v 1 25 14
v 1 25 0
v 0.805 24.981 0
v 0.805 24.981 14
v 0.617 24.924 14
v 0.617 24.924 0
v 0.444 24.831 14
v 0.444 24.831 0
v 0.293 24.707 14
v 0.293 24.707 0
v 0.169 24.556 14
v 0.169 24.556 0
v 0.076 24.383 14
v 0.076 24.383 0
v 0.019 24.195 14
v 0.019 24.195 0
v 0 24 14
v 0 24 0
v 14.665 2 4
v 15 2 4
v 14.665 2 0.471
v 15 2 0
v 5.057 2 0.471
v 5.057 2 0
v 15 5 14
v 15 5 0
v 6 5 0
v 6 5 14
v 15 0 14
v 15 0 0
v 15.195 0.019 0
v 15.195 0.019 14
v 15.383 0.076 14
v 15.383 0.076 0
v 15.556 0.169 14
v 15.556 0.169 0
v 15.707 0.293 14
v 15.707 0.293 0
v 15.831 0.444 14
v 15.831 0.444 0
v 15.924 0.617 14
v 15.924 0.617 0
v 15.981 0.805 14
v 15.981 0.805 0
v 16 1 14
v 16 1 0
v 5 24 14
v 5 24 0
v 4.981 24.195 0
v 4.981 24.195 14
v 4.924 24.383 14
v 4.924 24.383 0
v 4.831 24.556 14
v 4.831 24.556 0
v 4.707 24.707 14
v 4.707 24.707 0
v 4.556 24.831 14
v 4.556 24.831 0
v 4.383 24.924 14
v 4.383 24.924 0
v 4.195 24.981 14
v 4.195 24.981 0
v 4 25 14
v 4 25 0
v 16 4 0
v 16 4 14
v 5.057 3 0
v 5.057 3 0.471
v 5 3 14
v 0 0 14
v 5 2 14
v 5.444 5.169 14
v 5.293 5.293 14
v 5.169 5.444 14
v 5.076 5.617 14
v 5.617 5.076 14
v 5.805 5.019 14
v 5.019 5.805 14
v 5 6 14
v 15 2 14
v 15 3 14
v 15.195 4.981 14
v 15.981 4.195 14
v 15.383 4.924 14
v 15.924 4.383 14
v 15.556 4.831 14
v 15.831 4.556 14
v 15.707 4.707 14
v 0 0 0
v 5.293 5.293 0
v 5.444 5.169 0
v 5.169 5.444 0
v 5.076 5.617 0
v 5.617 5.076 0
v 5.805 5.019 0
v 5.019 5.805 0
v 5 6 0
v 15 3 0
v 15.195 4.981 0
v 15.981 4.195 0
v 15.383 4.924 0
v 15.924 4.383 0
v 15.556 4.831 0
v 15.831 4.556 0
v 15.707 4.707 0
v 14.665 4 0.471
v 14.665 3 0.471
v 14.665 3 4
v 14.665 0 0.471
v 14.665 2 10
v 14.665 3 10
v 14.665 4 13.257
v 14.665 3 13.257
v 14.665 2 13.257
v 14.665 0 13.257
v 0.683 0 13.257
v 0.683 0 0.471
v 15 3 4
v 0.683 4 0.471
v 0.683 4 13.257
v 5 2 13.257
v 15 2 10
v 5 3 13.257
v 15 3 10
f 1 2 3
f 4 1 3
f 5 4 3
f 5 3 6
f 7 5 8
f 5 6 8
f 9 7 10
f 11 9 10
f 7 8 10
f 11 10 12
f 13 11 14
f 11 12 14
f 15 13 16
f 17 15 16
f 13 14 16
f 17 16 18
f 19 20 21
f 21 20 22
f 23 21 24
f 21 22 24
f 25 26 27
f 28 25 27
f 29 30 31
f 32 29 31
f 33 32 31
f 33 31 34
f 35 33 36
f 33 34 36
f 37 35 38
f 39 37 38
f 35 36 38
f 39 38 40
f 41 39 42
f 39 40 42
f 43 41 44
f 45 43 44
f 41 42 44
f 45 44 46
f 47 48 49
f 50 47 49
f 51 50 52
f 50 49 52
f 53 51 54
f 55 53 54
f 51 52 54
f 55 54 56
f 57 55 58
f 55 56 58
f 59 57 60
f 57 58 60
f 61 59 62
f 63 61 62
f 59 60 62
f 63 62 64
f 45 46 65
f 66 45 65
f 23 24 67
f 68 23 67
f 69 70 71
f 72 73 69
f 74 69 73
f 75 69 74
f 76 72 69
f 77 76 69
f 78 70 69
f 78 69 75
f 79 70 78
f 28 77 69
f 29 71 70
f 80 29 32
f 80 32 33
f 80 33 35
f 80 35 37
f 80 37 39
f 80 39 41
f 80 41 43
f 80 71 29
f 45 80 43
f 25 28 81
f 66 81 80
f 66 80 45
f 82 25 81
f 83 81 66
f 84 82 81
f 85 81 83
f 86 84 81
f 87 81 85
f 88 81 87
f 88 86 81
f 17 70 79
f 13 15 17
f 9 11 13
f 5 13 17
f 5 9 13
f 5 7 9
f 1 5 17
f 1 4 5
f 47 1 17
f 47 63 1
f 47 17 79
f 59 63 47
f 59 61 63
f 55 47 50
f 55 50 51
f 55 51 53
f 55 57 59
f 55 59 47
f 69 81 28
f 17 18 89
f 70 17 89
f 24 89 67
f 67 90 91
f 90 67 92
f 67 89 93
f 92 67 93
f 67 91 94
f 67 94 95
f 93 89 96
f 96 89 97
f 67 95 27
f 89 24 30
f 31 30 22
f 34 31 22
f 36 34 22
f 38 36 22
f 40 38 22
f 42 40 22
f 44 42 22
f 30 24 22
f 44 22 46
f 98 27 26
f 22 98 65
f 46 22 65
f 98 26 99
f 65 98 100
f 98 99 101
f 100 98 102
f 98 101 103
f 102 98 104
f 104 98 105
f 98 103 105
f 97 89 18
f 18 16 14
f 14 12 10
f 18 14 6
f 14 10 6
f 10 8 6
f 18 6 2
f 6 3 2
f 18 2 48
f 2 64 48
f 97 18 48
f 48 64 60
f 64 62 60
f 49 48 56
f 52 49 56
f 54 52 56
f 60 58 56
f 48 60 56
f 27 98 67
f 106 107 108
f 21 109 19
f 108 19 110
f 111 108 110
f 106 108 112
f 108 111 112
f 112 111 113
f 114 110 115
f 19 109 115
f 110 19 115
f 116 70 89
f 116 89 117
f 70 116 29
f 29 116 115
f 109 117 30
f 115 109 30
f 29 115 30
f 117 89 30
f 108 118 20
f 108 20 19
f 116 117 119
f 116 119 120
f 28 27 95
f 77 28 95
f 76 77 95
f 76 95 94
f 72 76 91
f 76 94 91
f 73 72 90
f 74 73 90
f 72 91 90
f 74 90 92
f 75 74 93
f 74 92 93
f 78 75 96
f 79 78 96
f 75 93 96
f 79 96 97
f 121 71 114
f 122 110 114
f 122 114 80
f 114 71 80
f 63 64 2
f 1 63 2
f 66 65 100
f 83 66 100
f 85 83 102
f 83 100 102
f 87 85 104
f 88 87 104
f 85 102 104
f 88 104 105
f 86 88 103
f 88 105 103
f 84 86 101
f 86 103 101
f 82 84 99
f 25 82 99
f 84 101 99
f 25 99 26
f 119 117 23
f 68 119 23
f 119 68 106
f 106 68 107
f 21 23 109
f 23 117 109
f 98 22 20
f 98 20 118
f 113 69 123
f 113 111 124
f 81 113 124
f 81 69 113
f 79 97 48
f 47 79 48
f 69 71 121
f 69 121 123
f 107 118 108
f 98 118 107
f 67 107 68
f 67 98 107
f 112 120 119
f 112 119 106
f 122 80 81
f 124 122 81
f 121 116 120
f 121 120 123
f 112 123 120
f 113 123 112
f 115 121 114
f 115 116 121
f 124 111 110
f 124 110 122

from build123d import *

# Parameters (mm, degrees)
BOSS_EXTRUDE3_DEPTH = 14
SKETCH3_W           = 13.981436564
SKETCH3_H           = 12.786132402
CUT_EXTRUDE2_DEPTH  = 4
SKETCH4_W           = 10
SKETCH4_H           = 1
CUT_EXTRUDE3_DEPTH  = 4
SKETCH5_W           = 8
SKETCH5_H           = 1
CUT_EXTRUDE4_DEPTH  = 4
SKETCH6_W           = 1.942983733
SKETCH6_H           = 1
CUT_EXTRUDE5_DEPTH  = 4


with BuildPart() as part:
    # Sketch1 → Boss-Extrude3 (new body)
    with BuildSketch(Plane.XY):
        with BuildLine():
            Line((0, 24), (0, 0))
            Line((0, 0), (15, 0))
            ThreePointArc((15, 0), (15.707106781, 0.292893219), (16, 1))
            Line((16, 1), (16, 4))
            ThreePointArc((16, 4), (15.707106781, 4.707106781), (15, 5))
            Line((15, 5), (6, 5))
            ThreePointArc((6, 5), (5.292893219, 5.292893219), (5, 6))
            Line((5, 6), (5, 24))
            ThreePointArc((5, 24), (4.707106781, 24.707106781), (4, 25))
            Line((4, 25), (1, 25))
            ThreePointArc((1, 25), (0.292893219, 24.707106781), (0, 24))
        make_face()
    extrude(amount=BOSS_EXTRUDE3_DEPTH)

    # Sketch3 → Cut-Extrude2 (cut)
    with BuildSketch(Plane.XZ):
        with Locations((7.674007956, 6.864169982)):
            Rectangle(SKETCH3_W, SKETCH3_H)
    extrude(amount=-CUT_EXTRUDE2_DEPTH, mode=Mode.SUBTRACT)

    # Sketch4 → Cut-Extrude3 (cut)
    with BuildSketch(Plane.XY.offset(14)):
        with Locations((10, 2.5)):
            Rectangle(SKETCH4_W, SKETCH4_H)
    extrude(amount=-CUT_EXTRUDE3_DEPTH, mode=Mode.SUBTRACT)

    # Sketch5 → Cut-Extrude4 (cut)
    with BuildSketch(Plane(origin=(0, 0, 0), x_dir=(-1, 0, 0), z_dir=(0, 0, -1))):
        with Locations((-11, 2.5)):
            Rectangle(SKETCH5_W, SKETCH5_H)
    extrude(amount=-CUT_EXTRUDE4_DEPTH, mode=Mode.SUBTRACT)

    # Sketch6 → Cut-Extrude5 (cut)
    with BuildSketch(Plane(origin=(0, 0, 0), x_dir=(-1, 0, 0), z_dir=(0, 0, -1))):
        with Locations((-6.028508134, 2.5)):
            Rectangle(SKETCH6_W, SKETCH6_H)
    extrude(amount=-CUT_EXTRUDE5_DEPTH, mode=Mode.SUBTRACT)


solid = part.part
